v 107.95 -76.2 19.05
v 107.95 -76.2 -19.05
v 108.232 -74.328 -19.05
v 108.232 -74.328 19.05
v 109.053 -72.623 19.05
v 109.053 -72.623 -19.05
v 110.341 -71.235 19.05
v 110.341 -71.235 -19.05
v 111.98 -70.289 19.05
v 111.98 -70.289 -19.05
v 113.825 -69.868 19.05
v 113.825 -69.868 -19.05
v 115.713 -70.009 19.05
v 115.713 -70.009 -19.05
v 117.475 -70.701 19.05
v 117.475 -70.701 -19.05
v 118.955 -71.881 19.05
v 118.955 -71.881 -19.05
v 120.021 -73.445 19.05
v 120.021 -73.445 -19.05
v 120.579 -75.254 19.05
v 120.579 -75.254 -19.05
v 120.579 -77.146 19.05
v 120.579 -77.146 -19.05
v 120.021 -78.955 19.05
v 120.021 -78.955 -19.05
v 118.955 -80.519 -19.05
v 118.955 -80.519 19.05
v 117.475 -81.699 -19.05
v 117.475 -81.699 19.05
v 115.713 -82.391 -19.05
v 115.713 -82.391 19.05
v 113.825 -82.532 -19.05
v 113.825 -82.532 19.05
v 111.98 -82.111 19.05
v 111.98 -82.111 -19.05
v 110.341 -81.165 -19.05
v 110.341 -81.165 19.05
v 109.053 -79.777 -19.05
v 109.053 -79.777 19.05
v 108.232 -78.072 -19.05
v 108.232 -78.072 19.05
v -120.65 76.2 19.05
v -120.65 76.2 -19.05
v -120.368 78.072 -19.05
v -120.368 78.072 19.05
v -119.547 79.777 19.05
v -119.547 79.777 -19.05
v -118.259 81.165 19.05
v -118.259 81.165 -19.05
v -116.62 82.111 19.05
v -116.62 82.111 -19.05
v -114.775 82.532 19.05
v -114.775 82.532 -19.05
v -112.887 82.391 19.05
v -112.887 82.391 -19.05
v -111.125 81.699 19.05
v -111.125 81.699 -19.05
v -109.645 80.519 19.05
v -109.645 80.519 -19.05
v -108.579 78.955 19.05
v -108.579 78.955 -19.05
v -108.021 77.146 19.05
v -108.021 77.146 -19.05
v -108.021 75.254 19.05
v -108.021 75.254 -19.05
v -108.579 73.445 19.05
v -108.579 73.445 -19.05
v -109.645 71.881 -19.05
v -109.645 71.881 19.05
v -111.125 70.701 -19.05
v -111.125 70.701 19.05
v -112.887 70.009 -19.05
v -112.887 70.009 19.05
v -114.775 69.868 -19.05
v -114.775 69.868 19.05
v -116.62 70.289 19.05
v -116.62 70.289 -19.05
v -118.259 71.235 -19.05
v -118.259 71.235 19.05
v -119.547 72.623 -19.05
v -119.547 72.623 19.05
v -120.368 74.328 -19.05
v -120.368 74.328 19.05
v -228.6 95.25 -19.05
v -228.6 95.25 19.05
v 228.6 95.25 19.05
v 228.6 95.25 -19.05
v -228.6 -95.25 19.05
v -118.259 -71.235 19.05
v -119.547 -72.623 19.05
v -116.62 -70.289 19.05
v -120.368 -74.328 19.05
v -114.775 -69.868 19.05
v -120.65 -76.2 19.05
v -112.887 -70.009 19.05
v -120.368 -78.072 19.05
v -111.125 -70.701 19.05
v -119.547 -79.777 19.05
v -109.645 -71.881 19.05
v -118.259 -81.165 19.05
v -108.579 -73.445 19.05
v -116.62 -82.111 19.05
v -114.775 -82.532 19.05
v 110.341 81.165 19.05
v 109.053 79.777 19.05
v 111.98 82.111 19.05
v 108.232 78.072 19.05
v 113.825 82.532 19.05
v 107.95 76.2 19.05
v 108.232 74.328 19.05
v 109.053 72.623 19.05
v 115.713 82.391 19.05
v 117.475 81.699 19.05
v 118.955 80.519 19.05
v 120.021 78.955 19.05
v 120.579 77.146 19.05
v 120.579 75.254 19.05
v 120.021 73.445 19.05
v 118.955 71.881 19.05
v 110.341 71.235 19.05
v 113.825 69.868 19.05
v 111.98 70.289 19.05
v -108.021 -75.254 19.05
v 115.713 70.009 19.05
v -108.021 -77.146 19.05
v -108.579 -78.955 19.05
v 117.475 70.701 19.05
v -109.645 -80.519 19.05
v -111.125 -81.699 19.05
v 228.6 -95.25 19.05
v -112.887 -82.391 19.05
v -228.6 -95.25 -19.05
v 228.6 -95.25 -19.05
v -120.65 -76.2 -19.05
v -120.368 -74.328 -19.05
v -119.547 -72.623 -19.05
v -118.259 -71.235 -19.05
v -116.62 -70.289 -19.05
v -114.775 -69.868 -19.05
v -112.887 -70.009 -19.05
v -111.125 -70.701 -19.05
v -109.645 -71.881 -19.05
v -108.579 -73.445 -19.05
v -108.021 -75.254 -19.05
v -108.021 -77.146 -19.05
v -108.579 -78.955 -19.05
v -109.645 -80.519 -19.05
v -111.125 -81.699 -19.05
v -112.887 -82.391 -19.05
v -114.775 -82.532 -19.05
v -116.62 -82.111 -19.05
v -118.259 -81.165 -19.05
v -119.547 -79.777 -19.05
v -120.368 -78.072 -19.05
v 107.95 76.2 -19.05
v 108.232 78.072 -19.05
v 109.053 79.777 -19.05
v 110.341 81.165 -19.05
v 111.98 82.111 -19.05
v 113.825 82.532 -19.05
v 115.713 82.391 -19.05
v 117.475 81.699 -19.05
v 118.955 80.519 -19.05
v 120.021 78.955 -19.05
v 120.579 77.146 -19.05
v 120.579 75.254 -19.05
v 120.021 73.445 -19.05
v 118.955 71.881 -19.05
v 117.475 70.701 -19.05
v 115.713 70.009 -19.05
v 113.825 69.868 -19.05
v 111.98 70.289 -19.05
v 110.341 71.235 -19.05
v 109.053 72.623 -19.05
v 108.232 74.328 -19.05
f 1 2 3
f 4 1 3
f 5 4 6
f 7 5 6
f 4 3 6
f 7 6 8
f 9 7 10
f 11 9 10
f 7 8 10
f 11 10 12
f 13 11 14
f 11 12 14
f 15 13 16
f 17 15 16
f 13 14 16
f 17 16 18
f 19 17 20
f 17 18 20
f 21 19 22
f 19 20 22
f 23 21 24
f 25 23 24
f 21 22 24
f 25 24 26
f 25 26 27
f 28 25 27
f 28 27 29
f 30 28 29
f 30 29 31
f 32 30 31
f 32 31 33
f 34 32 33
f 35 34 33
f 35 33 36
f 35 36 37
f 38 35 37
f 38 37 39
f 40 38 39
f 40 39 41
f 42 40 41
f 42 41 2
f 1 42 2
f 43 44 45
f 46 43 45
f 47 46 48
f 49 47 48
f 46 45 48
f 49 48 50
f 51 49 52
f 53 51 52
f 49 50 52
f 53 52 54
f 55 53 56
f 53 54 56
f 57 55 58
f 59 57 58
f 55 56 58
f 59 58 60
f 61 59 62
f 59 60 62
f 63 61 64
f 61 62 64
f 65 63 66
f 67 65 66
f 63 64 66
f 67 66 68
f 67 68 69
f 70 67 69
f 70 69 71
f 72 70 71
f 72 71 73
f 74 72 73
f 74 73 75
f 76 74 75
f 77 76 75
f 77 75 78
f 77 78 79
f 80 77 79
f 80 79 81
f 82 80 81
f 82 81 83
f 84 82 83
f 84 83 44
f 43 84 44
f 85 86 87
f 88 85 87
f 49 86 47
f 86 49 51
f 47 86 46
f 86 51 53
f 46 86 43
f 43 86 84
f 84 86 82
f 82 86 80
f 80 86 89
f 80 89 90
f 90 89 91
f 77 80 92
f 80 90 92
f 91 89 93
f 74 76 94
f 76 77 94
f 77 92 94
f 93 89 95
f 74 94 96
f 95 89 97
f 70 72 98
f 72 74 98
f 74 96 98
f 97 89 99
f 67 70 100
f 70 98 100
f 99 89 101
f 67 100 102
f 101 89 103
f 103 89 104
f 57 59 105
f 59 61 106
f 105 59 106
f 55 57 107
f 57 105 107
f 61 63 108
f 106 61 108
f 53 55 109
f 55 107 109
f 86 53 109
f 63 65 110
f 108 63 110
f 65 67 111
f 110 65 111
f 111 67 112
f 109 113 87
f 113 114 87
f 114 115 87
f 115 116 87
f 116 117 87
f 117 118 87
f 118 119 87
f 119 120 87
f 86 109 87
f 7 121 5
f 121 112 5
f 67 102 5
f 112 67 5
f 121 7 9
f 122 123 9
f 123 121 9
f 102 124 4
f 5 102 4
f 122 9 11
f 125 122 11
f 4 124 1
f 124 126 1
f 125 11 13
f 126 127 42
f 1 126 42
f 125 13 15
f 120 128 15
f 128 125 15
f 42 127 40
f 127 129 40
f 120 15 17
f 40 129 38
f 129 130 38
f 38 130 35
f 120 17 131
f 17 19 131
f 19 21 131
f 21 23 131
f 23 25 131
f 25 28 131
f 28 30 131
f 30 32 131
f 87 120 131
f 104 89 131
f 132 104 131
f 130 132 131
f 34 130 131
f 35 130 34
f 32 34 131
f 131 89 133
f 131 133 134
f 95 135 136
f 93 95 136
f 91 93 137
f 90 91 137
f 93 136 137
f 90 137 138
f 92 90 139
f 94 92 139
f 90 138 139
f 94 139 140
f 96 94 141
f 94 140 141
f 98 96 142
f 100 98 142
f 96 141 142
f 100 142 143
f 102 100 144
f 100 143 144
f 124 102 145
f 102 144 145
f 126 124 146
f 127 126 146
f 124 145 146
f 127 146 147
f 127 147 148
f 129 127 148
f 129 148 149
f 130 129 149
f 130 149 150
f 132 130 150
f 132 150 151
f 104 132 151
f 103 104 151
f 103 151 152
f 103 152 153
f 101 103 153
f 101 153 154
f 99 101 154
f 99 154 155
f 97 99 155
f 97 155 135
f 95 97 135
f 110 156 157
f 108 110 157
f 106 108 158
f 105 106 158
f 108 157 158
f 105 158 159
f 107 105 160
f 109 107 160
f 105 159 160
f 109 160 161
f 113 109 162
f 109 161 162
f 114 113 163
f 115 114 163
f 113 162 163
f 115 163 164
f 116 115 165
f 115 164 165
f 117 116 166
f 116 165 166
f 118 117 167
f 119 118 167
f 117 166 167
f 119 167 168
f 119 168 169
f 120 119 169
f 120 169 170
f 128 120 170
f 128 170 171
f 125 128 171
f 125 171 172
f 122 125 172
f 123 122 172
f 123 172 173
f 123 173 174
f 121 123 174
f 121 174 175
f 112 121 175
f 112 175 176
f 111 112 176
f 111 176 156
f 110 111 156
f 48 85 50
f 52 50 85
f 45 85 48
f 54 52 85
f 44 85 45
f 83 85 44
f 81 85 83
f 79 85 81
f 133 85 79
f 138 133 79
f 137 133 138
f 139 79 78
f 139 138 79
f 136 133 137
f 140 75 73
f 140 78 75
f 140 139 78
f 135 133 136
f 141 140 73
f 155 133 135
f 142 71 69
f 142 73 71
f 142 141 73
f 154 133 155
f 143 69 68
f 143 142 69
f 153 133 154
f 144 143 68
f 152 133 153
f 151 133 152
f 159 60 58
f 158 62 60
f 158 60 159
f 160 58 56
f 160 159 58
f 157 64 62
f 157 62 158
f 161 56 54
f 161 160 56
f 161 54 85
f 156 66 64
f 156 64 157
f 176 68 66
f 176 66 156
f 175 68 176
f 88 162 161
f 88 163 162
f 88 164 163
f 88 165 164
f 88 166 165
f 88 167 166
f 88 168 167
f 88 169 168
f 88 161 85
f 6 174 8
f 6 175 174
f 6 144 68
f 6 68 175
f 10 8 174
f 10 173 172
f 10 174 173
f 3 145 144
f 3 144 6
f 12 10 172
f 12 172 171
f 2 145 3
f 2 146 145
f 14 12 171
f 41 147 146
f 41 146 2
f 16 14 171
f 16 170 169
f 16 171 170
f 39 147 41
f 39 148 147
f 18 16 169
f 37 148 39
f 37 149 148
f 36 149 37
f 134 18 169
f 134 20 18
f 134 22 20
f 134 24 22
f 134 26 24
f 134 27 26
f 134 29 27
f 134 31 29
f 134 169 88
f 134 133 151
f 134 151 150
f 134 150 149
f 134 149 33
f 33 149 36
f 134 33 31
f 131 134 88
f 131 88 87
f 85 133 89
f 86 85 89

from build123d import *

# Parameters (mm, degrees)
F0_W       = 457.2
F0_H       = 38.1
F1_DEPTH   = 95.25
F4_D       = 12.7
F4_DEPTH   = 609.6
F4_TIP     = 3.8154649308
F4_2_D     = 12.7
F4_2_DEPTH = 609.6
F4_2_TIP   = 3.8154649308
F5_D       = 12.7
F5_DEPTH   = 609.6
F5_TIP     = 3.8154649308
F5_2_D     = 12.7
F5_2_DEPTH = 609.6
F5_2_TIP   = 3.8154649308
F6_D       = 12.7
F6_DEPTH   = 609.6
F6_TIP     = 3.8154649308
F6_2_D     = 12.7
F6_2_DEPTH = 609.6
F6_2_TIP   = 3.8154649308
F7_D       = 12.7
F7_DEPTH   = 609.6
F7_TIP     = 3.8154649308
F7_2_D     = 12.7
F7_2_DEPTH = 609.6
F7_2_TIP   = 3.8154649308


# Not quite as in the source:
# - a feature names something its author has since deleted; it is built from what else it names


with BuildPart() as f1:
    # F0 (on Front) → F1 (new body, symmetric)
    with BuildSketch(Plane.XZ):
        Rectangle(F0_W, F0_H)
    extrude(amount=F1_DEPTH, both=True)


with BuildPart() as f2_1:
    # F2: copy of F1
    add(f1.part.moved(Location((0, 0, 152.4))))

    # F4#2
    with Locations(Plane.XY.offset(171.45)):
        with Locations((-114.3, 76.2)):
            Hole(F4_2_D / 2, depth=F4_2_DEPTH)
            with Locations((0, 0, -(F4_2_DEPTH + F4_2_TIP / 2))):  # 118° drill point
                Cone(0, F4_2_D / 2, F4_2_TIP, mode=Mode.SUBTRACT)

    # F5#2
    with Locations(Plane.XY.offset(171.45)):
        with Locations((114.3, 76.2)):
            Hole(F5_2_D / 2, depth=F5_2_DEPTH)
            with Locations((0, 0, -(F5_2_DEPTH + F5_2_TIP / 2))):  # 118° drill point
                Cone(0, F5_2_D / 2, F5_2_TIP, mode=Mode.SUBTRACT)

    # F6#2
    with Locations(Plane.XY.offset(171.45)):
        with Locations((-114.3, -76.2)):
            Hole(F6_2_D / 2, depth=F6_2_DEPTH)
            with Locations((0, 0, -(F6_2_DEPTH + F6_2_TIP / 2))):  # 118° drill point
                Cone(0, F6_2_D / 2, F6_2_TIP, mode=Mode.SUBTRACT)

    # F7#2
    with Locations(Plane.XY.offset(171.45)):
        with Locations((114.3, -76.2)):
            Hole(F7_2_D / 2, depth=F7_2_DEPTH)
            with Locations((0, 0, -(F7_2_DEPTH + F7_2_TIP / 2))):  # 118° drill point
                Cone(0, F7_2_D / 2, F7_2_TIP, mode=Mode.SUBTRACT)


with BuildPart() as f1_1:
    add(f1.part)

    # F4
    with Locations(Plane.XY.offset(171.45)):
        with Locations((-114.3, 76.2)):
            Hole(F4_D / 2, depth=F4_DEPTH)
            with Locations((0, 0, -(F4_DEPTH + F4_TIP / 2))):  # 118° drill point
                Cone(0, F4_D / 2, F4_TIP, mode=Mode.SUBTRACT)

    # F5
    with Locations(Plane.XY.offset(171.45)):
        with Locations((114.3, 76.2)):
            Hole(F5_D / 2, depth=F5_DEPTH)
            with Locations((0, 0, -(F5_DEPTH + F5_TIP / 2))):  # 118° drill point
                Cone(0, F5_D / 2, F5_TIP, mode=Mode.SUBTRACT)

    # F6
    with Locations(Plane.XY.offset(171.45)):
        with Locations((-114.3, -76.2)):
            Hole(F6_D / 2, depth=F6_DEPTH)
            with Locations((0, 0, -(F6_DEPTH + F6_TIP / 2))):  # 118° drill point
                Cone(0, F6_D / 2, F6_TIP, mode=Mode.SUBTRACT)

    # F7
    with Locations(Plane.XY.offset(171.45)):
        with Locations((114.3, -76.2)):
            Hole(F7_D / 2, depth=F7_DEPTH)
            with Locations((0, 0, -(F7_DEPTH + F7_TIP / 2))):  # 118° drill point
                Cone(0, F7_D / 2, F7_TIP, mode=Mode.SUBTRACT)


solid = f1_1.part
